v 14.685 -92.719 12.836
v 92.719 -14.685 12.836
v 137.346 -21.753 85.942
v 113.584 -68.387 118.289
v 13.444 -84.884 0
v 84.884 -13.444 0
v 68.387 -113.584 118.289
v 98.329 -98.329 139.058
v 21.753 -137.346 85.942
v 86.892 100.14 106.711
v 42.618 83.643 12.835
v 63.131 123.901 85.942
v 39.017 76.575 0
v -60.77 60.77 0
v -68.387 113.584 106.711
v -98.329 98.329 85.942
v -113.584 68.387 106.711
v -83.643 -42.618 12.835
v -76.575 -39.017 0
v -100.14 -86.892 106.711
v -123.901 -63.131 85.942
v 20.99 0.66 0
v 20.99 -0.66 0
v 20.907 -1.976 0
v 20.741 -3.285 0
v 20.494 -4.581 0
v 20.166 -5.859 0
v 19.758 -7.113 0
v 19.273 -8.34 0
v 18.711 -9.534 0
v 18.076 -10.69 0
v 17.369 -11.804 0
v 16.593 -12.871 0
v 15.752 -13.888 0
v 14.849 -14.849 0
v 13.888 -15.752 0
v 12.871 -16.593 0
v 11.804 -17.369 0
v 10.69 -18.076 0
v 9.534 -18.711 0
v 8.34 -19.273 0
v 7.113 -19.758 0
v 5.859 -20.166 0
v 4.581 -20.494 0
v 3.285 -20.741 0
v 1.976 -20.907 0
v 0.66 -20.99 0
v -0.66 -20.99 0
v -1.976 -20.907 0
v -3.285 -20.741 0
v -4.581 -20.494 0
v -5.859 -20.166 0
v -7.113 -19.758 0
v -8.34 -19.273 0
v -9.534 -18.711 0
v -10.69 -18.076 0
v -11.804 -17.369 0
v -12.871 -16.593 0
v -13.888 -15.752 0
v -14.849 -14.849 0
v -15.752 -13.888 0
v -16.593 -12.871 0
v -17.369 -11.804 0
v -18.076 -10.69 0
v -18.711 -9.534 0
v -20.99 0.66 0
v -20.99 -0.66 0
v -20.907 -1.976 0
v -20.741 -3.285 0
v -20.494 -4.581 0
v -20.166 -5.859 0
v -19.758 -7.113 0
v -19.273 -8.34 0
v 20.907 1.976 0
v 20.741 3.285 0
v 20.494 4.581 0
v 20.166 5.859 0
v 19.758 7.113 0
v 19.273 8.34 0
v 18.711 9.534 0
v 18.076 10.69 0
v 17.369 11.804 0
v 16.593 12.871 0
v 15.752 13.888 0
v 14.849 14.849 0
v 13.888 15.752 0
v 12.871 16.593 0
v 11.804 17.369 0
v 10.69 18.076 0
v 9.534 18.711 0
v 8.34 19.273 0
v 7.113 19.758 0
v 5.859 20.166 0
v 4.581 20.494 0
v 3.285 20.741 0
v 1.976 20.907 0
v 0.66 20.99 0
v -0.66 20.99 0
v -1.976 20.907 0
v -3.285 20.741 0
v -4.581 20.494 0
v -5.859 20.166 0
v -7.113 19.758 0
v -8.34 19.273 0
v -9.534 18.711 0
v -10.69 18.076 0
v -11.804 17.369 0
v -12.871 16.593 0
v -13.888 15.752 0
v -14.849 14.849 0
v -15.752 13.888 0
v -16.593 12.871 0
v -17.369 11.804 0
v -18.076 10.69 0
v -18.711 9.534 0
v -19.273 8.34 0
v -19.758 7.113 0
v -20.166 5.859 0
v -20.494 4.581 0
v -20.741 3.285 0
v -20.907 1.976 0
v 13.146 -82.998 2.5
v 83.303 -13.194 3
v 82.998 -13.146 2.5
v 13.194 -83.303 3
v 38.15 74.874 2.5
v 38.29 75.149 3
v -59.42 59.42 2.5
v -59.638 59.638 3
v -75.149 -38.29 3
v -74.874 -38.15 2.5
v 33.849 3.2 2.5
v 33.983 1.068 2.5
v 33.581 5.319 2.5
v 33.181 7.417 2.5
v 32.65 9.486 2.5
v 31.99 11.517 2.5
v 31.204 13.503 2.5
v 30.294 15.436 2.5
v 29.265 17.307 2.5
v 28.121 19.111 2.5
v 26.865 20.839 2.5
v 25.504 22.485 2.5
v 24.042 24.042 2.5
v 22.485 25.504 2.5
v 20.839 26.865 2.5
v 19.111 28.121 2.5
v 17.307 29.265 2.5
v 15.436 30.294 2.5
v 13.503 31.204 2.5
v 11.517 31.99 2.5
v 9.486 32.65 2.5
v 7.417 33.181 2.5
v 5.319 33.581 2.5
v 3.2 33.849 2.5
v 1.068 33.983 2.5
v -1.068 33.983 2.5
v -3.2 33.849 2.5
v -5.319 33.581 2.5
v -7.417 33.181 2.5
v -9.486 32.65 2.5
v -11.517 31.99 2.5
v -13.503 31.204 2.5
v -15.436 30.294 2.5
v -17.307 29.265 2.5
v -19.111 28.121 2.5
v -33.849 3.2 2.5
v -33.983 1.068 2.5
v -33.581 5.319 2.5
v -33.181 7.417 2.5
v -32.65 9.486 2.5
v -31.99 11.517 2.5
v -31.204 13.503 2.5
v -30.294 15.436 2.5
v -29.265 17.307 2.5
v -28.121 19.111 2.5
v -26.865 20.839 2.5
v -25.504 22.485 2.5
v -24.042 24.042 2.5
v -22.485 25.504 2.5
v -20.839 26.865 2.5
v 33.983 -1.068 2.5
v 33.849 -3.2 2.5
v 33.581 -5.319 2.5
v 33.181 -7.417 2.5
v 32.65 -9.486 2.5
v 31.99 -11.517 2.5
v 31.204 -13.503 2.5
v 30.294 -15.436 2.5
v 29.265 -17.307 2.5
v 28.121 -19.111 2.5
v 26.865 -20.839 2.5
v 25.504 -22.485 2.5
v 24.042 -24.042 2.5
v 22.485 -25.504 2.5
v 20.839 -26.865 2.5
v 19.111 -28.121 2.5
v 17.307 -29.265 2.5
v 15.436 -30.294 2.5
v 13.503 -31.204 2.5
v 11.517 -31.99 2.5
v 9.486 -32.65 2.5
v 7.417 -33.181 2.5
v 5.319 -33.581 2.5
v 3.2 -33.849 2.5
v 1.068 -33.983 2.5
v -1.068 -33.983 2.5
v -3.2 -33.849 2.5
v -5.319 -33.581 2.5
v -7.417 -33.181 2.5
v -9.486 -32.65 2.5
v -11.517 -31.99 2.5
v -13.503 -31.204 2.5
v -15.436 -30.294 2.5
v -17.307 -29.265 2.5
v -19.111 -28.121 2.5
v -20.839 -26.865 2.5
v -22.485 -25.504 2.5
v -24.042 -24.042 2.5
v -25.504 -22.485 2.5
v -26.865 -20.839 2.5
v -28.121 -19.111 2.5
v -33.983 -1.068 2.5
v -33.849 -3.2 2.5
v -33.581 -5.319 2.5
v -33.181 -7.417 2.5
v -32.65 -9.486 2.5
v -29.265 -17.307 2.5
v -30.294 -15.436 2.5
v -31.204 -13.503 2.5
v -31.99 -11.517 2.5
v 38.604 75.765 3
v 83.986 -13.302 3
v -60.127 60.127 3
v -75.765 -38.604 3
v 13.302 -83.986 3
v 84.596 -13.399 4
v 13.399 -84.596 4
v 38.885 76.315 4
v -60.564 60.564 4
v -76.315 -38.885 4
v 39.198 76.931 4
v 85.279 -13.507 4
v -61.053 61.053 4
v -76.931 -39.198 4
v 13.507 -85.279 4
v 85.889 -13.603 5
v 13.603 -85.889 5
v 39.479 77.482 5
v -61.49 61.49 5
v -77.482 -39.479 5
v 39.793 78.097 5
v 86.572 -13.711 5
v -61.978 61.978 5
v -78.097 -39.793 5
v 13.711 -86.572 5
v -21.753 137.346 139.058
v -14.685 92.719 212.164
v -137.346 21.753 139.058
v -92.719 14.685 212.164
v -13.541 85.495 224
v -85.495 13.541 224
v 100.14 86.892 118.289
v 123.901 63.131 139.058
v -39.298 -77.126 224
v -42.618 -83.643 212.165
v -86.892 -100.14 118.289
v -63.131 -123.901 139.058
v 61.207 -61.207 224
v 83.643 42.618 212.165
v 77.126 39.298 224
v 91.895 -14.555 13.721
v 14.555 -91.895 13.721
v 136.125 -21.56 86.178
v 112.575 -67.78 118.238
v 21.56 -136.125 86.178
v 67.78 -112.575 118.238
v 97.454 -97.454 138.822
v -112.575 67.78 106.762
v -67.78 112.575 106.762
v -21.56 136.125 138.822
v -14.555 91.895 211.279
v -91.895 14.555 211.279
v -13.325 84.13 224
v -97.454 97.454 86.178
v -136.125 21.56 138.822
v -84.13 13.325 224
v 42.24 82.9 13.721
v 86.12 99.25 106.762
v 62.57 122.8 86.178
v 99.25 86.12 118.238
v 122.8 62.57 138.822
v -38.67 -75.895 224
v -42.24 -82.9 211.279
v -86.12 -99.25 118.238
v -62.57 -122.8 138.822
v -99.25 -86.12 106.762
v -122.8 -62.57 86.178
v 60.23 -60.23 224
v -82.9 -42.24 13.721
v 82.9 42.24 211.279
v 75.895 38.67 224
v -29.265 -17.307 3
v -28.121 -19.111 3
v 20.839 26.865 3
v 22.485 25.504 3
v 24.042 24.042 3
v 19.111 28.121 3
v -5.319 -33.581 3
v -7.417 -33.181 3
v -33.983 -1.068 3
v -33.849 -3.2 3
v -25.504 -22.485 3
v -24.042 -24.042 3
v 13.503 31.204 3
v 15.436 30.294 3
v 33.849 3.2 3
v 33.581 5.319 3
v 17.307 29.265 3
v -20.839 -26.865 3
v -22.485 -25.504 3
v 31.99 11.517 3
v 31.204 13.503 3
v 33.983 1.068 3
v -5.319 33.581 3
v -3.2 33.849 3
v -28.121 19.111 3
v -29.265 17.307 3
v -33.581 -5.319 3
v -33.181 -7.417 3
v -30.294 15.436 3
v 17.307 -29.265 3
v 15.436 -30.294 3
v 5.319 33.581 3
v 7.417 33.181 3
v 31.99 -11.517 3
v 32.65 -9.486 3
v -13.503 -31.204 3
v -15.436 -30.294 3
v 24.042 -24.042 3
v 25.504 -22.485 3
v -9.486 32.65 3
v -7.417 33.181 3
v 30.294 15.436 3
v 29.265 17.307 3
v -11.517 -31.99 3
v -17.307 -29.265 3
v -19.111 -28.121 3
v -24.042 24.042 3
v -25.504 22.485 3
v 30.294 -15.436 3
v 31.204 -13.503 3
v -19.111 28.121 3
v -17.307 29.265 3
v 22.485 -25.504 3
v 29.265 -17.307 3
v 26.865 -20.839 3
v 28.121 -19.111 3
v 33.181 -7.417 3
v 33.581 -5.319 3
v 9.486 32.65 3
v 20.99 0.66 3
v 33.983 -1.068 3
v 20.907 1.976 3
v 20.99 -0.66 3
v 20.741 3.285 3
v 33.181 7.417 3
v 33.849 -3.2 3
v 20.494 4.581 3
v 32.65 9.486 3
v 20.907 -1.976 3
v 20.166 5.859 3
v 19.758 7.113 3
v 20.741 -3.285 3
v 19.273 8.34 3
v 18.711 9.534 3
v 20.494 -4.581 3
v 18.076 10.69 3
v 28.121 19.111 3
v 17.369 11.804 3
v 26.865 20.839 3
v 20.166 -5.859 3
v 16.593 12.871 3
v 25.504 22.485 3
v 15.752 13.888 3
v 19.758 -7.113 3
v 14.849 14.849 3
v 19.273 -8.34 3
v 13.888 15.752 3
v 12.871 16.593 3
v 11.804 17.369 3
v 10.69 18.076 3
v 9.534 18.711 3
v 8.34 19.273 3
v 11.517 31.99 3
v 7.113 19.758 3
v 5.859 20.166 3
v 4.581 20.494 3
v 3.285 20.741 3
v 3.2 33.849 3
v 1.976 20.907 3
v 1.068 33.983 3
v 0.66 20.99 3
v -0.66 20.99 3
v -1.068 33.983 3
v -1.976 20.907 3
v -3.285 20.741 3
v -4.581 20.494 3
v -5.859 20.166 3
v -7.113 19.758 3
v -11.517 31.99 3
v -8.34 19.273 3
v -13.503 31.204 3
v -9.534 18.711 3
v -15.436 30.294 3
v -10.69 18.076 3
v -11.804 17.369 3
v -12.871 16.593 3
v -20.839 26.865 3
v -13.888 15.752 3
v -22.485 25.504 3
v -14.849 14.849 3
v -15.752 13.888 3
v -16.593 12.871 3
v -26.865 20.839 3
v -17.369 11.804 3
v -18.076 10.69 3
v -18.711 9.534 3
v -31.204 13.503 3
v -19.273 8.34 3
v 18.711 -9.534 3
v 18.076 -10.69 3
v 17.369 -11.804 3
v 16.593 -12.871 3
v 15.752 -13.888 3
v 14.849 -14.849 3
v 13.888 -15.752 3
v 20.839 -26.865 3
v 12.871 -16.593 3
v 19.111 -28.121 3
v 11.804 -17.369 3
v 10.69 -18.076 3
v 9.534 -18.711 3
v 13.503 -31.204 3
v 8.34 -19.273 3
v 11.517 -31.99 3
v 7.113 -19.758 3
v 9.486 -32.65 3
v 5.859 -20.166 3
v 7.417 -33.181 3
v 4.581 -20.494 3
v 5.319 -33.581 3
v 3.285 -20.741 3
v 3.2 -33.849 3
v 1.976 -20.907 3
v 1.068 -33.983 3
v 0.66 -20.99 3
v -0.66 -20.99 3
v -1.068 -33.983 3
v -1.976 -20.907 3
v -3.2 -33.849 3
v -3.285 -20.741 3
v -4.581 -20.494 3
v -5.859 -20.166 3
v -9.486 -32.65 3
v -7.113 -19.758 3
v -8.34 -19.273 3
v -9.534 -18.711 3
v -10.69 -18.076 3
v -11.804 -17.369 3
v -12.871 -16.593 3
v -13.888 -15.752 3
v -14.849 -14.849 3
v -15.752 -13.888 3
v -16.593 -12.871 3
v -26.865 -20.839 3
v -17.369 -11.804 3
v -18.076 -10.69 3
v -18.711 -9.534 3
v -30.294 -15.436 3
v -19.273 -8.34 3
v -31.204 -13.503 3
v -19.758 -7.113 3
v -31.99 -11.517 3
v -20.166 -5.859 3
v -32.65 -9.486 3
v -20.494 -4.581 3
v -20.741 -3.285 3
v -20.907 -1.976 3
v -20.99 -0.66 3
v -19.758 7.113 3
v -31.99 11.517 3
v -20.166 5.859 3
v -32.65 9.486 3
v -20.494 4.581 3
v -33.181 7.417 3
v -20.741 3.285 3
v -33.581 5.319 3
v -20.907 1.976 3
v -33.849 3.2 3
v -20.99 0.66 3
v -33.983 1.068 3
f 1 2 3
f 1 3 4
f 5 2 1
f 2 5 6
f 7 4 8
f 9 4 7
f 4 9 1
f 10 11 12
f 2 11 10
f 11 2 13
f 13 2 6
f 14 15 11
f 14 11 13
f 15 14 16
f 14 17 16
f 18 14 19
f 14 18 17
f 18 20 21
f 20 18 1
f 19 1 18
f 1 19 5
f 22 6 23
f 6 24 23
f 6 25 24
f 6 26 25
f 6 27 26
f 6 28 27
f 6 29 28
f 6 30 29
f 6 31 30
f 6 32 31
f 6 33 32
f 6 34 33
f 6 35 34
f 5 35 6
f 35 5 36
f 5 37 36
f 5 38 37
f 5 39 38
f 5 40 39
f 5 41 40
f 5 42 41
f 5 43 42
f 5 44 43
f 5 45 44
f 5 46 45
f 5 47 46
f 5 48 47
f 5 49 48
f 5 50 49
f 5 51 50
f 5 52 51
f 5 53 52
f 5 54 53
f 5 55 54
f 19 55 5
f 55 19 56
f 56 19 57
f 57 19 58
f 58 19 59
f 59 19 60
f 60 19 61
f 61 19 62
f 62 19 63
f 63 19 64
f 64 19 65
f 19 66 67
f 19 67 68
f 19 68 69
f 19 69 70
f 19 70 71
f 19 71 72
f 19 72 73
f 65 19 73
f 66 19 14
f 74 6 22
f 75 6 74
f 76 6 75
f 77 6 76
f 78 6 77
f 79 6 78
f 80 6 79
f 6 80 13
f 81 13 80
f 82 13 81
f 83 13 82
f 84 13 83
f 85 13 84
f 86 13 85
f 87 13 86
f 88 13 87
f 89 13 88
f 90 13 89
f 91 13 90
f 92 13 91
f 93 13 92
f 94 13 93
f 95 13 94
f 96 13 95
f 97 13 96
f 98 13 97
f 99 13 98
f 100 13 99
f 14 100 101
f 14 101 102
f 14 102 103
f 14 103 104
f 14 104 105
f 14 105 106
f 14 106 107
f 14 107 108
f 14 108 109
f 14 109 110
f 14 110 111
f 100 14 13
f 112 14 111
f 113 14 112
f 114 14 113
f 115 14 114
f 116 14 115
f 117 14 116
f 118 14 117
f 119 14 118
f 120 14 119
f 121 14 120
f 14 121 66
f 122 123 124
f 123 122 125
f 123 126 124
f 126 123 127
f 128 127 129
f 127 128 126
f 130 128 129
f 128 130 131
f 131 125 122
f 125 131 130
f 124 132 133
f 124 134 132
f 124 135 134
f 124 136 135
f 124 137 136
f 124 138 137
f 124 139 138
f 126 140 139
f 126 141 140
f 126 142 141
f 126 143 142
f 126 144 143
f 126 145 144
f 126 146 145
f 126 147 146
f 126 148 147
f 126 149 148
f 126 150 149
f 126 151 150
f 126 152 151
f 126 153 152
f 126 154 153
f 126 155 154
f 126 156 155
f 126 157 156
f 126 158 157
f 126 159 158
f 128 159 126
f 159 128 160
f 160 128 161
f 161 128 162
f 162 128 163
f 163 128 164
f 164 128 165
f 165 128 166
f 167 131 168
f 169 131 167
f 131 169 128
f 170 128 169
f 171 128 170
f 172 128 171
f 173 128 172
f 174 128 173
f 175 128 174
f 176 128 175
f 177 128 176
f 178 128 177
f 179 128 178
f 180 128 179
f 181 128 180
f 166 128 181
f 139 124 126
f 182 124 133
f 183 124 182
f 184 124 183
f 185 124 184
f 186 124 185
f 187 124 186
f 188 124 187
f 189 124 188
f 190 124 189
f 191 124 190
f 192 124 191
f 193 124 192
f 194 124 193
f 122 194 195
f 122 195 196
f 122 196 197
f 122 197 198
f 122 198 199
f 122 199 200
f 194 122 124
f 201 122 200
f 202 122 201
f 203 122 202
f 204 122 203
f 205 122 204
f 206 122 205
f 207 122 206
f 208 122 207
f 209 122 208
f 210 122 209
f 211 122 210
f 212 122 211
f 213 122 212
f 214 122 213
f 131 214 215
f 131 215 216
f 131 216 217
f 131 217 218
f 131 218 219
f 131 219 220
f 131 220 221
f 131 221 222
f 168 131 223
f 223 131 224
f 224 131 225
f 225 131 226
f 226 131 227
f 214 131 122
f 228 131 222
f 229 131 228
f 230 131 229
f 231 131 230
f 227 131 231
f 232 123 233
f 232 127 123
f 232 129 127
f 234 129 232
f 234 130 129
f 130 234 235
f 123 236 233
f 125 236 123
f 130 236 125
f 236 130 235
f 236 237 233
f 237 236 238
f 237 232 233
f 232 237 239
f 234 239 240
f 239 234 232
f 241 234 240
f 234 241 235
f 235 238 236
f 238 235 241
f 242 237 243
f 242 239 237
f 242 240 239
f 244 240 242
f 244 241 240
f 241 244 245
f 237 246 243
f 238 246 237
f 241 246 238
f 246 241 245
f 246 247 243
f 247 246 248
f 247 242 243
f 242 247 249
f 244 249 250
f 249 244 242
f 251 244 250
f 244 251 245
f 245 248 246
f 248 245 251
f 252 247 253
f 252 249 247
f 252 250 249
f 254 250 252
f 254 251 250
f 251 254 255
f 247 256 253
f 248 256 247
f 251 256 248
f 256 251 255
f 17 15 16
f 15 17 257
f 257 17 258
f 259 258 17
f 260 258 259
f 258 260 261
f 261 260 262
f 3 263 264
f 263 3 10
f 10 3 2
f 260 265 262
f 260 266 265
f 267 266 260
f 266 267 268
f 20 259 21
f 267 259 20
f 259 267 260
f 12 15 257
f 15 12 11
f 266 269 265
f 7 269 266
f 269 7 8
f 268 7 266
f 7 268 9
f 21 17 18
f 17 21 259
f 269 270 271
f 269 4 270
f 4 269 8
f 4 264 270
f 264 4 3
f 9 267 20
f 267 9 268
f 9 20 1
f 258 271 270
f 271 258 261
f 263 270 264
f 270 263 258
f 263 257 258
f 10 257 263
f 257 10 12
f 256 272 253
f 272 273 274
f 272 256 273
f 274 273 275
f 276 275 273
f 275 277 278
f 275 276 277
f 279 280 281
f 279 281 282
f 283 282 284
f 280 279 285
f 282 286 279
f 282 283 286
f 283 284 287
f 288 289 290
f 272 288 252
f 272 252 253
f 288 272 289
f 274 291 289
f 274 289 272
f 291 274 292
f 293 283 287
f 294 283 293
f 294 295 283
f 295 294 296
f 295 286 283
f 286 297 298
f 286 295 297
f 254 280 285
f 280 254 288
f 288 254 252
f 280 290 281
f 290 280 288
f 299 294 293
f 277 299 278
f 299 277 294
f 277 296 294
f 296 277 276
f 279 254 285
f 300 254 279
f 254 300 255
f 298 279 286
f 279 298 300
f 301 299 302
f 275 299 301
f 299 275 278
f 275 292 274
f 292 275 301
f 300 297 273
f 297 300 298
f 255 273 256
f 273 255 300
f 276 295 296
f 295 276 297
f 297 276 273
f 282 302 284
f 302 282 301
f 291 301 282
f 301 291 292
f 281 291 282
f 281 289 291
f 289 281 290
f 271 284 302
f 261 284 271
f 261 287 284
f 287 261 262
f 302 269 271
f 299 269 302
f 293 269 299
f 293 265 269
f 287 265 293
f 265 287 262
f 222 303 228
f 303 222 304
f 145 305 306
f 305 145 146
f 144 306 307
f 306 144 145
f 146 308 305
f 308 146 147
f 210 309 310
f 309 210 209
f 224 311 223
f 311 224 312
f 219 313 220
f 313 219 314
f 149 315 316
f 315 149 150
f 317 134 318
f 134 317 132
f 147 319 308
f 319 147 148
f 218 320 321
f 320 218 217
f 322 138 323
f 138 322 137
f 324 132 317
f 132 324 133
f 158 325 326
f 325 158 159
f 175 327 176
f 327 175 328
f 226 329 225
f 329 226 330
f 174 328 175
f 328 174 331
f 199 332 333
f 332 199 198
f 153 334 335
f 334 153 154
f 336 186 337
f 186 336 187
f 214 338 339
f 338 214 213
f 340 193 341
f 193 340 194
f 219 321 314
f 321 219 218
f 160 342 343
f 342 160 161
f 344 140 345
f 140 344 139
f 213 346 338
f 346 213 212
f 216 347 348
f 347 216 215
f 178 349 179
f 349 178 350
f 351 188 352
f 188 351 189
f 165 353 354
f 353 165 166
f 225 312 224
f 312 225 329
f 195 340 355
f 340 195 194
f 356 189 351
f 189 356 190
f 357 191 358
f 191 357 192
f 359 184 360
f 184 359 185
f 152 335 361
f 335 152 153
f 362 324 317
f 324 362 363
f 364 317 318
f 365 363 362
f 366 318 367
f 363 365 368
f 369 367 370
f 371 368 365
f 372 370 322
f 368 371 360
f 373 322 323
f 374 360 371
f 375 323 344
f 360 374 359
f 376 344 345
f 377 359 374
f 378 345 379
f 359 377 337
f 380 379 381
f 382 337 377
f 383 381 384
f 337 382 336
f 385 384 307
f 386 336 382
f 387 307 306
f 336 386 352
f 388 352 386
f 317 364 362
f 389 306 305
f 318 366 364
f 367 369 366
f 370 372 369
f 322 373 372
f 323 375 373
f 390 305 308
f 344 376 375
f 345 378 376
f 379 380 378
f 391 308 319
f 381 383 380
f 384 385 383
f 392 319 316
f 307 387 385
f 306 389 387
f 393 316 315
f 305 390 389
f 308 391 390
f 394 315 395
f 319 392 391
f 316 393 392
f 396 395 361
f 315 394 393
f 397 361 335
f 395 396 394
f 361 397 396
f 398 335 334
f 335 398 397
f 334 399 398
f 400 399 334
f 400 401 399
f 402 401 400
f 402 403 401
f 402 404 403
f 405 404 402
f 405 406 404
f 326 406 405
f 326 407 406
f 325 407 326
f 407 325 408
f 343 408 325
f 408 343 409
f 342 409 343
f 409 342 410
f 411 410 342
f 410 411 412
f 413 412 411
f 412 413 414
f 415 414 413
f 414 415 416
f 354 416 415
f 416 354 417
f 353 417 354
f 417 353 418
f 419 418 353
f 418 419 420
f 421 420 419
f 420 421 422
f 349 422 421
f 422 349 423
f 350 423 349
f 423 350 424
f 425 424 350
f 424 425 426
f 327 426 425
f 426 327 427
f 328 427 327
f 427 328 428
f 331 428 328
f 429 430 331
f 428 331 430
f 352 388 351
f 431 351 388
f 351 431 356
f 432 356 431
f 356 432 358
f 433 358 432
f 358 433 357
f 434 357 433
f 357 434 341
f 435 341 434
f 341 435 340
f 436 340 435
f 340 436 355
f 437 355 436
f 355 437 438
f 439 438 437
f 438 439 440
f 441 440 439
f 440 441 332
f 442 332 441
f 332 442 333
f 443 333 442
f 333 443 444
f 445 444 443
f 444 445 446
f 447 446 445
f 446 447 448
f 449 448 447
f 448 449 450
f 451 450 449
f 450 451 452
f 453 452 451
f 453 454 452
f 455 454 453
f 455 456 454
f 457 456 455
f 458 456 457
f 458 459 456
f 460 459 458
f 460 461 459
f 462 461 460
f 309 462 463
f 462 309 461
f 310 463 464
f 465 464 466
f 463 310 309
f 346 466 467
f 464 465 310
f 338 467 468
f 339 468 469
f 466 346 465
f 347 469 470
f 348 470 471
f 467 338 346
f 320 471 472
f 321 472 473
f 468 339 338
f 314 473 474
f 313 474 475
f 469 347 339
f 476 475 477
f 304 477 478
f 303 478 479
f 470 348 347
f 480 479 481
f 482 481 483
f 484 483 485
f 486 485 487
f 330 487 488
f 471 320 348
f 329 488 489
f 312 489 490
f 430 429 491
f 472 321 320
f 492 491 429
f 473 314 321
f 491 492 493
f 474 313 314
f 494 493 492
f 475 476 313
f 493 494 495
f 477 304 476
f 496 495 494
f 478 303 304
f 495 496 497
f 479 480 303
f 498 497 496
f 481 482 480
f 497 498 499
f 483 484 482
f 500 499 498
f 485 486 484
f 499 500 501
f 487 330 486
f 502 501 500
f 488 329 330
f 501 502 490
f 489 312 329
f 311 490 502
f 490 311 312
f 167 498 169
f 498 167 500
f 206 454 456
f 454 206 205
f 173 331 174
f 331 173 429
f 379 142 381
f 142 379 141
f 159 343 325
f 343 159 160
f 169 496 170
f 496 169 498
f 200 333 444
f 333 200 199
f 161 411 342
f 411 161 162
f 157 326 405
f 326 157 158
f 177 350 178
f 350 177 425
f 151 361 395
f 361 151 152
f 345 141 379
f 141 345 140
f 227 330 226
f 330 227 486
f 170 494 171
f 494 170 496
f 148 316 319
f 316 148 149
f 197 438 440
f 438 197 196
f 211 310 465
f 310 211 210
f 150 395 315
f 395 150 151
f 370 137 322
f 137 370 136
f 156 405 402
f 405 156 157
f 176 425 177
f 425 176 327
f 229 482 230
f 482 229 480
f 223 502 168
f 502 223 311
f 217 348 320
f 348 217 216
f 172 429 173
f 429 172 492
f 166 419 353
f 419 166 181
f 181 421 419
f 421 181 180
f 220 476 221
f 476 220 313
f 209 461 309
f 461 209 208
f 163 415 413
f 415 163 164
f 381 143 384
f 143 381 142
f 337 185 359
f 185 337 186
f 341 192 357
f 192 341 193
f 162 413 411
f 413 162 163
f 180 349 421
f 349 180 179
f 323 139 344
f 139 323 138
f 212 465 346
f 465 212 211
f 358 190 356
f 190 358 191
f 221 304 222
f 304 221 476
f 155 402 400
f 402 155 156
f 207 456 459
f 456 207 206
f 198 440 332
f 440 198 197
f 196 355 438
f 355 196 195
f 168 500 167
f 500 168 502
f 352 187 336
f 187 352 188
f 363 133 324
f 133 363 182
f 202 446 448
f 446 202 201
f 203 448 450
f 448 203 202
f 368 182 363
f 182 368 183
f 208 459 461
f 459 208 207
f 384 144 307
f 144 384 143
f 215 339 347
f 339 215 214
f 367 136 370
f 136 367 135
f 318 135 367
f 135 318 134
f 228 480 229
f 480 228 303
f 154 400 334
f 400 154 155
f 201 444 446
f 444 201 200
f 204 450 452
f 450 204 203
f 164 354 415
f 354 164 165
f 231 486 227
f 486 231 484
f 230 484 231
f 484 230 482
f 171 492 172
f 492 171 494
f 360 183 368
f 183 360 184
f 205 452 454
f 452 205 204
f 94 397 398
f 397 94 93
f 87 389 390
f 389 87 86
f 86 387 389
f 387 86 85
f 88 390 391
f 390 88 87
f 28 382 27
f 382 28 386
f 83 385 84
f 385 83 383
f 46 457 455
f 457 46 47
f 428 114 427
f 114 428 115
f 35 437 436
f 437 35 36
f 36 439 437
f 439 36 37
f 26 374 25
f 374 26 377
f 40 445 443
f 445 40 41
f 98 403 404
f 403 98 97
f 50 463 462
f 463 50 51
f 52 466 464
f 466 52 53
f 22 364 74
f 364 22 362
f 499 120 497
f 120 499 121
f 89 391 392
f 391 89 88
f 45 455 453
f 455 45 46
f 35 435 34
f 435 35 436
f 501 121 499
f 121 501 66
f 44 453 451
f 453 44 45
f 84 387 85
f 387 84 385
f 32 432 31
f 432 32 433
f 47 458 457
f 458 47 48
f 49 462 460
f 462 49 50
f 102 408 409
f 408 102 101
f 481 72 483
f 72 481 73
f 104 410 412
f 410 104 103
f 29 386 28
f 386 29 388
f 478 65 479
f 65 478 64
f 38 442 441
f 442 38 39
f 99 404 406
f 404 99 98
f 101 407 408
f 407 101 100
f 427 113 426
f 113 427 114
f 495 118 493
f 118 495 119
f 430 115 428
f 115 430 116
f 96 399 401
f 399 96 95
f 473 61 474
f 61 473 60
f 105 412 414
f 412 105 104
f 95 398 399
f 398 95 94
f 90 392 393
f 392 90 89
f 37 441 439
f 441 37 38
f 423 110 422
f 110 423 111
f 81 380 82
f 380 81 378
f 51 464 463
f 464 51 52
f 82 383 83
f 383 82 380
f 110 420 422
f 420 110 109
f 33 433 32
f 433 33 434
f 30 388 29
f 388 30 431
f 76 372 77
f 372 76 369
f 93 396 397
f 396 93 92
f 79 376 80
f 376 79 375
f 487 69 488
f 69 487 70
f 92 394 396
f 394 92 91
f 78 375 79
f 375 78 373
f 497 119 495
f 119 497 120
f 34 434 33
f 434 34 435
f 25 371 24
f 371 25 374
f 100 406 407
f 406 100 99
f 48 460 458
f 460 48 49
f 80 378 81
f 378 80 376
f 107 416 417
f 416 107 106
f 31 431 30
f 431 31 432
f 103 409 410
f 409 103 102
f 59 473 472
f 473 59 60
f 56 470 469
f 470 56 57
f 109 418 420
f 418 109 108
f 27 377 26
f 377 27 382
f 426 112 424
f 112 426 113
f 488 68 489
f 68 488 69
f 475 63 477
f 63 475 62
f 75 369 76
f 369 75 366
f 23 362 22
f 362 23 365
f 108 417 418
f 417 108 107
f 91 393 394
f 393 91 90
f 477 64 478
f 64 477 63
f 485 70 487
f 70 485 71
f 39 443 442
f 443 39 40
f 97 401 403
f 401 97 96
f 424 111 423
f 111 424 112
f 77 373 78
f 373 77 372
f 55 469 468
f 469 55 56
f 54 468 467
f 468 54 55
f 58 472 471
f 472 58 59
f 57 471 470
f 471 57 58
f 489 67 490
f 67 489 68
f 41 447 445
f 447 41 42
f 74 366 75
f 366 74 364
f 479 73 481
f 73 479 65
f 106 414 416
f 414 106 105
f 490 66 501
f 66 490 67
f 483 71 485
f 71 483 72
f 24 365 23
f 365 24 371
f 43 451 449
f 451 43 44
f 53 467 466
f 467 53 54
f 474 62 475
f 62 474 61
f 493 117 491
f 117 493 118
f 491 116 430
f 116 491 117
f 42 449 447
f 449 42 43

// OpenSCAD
/*
 * Customizable Lamp Shade - https://www.thingiverse.com/thing:2372190
 * by Dennis Hofmann - https://www.thingiverse.com/mightynozzle/about
 * created 2017-06-08
 * version v1.0
 *
 * This work is licensed under the Creative Commons - Attribution - Non-Commercial license.
 * https://creativecommons.org/licenses/by-nc/3.0/
*/


 // Parameter Section//
//------------------//

// choose the shape of the lamp shade
lamp_shape = "dodecahedron"; //[simple,sphere,flower,dodecahedron]

// [Simple, sphere and flower shape] Resolution of round shapes. You can also use this value as the number of edges of the simple shade. If you want a cube or a pyramide, set the value of 4. If you want a cylinder or a cone, set the value of 100-255. Create a star shape with the flower shape with resolution of 3-5. Minimum value for a sphere shape is 7. You can use a low resolution (e.g. 16-32) to create a low polygon style. You can create some interesting shapes with this parameter. Just try some different values!
resolution = 64; //[3:255]

// Thinner for more translucency, thicker for more stable lamp shade. Default: 1.0
shell_thickness_in_millimeter = 1.0;

// [All lamp shapes] Set the diameter of the base of the lamp shade. The base is the position, where the bulb fitting is located. This parameter is used for all lamp shapes.
lamp_shade_base_diameter_in_millimeter = 225.0; //[1:300]

// [Simple and flower shape] Set the diameter of the head of the lamp shade. The head is the top position of the lamp shade. If this value is higher or lower than the base diameter, you get a cone or pyramide. Lower value can be used for desk lamp, higher value can be used for ceiling lamp. This parameter is used for simple and flower shape.
lamp_shade_head_diameter_in_millimeter = 10.0; //[1:300]

// [Simple and flower shape] Set the height of the lamp shade. This parameter is used for simple and flower shape
lamp_shade_height_in_millimeter = 110.0; //[1:300]

// [Sphere and dodecahedron shape] Set the cut height of the head of the shape. 0 means a closed top. It is like sclicing the top of an apple with a knife. This parameter is used for sphere and dodecahedron shape.
head_cut_height_in_millimeter = 1.0; //[0:200]

// [Sphere shape only] Set the cut height from the base of the shape. It is like sclicing the bottom of an apple with a knife. This parameter is used for sphere and dodecahedron shape.
base_cut_height_in_millimeter = 10.0;  //[0:200]

// [Flower shape only] This parameter only is used for flower shape
number_of_flower_leaves = 8; //[2:64]

// Set the diameter of the bulb bracket you want to use. Add a little extra for tolerance like 2mm if you are using a outside threaded bracket + nut/ring. If you are using a threadless bracket, it depends on the material. If it is a silicone one, you can use a little smaller hole. If it is non elastic plastic, this could be a challenge. If it is to loose, you can try to glue the gap between bracket and the lamp shade. Or do some test prints of the first 5-10 layers, before printing the whole lamp shade. Use 0, if you don't need a hole.
//bulb_bracket_diameter_in_millimeter = 0;
bulb_bracket_diameter_in_millimeter = 42.0;

// This is the additional support height for the bulb bracket. Depending on the bulb bracket you are using, this extra makes the hole more stable.
bulb_bracket_support_height_in_millimeter = 2.0;

// This is the additional support width for the bulb bracket. Depending on the bulb bracket you are using, this extra makes the hole more stable.
bulb_bracket_support_width_in_millimeter = 13.0;
//bulb_bracket_support_width_in_millimeter = 0.0;

// [Dodecahedron shape only] Extra support between walls and floor
use_dodecahedron_support = true;

// Later, perhaps (see above)
//floor_wall_support_thickness_in_millimeters = 2;
//floor_wall_support_width_in_millimeters = 6;
//floor_wall_support_height_in_millimeters = 6;

/* [Hidden] */
shape_height = lamp_shade_height_in_millimeter;
base_cut = base_cut_height_in_millimeter;
head_cut = head_cut_height_in_millimeter;
shell = shell_thickness_in_millimeter;
flower_leaves = number_of_flower_leaves;
bulb_bracket_d = bulb_bracket_diameter_in_millimeter;
bulb_bracket_support_w = bulb_bracket_support_width_in_millimeter;
bulb_bracket_support_h = bulb_bracket_support_height_in_millimeter;
shape_base_outside = lamp_shade_base_diameter_in_millimeter;
shape_head_outside = lamp_shade_head_diameter_in_millimeter;

shape_base_inside = shape_base_outside - shell * 2;
shape_head_inside = shape_head_outside - shell * 2;
$fn=resolution;


 // Program Section//
//-----------------//

// Main lampshade
color("DeepSkyBlue") rotate([0,0,45]) {
    difference() {
        union() {
            // Shape part
            if (lamp_shape == "simple") {
                simple_shape();
            } else if (lamp_shape == "sphere") {
                sphere_shape();
            } else if (lamp_shape == "flower") {
                flower_shape();
            } else if (lamp_shape == "dodecahedron") {
                if (use_dodecahedron_support) {
                    dodecahedron_support();
                }
                dodecahedron_shape();
            } else {
                echo("ERROR: Invalid lamp shade: \"", lam_shade, "\"");
            }
            
            // Bulb bracket support
            cylinder(d = bulb_bracket_d + bulb_bracket_support_w * 2, h = bulb_bracket_support_h + shell, $fn=100);
        }
        // Bottom bulb bracket hole
        translate([0,0,- 0.1]) {
            cylinder(d = bulb_bracket_d, h = shell + bulb_bracket_support_h + 0.2, $fn=100);
        }
    }
}

// Dodecahedron support
// FIXME: DIRTY HACK
module dodecahedron_support() {
    dodecahedron_shape(outside=shape_base_outside, inside=shape_base_inside-3, cut=shape_base_inside-1);
    dodecahedron_shape(outside=shape_base_outside, inside=shape_base_inside-2, cut=shape_base_inside-2);
    dodecahedron_shape(outside=shape_base_outside, inside=shape_base_inside-1, cut=shape_base_inside-3);
}

 // Module Section//
//---------------//

module simple_shape() {
    difference() {
        cylinder(d1 = shape_base_outside, d2 = shape_head_outside, h = shape_height);
        translate([0, 0, shell]) {
            cylinder(d1 = shape_base_inside, d2 = shape_head_inside, h = shape_height);
        }
    }
}

module sphere_shape() {
    translate([0, 0, shape_base_outside / 2 - base_cut]) {
        difference() {
            base_cut_sphere(shape_base_outside, base_cut);
            translate([0, 0, shell / 2]) {
                base_cut_sphere(shape_base_inside, base_cut);
            }
            // Head Cut
            translate([0, 0, shape_base_outside / 2 - head_cut]) {
                cylinder(d = shape_base_outside * 2, h = head_cut);
            }
        }
    }
}

module flower_shape() {
    difference() {
        flower(shape_base_outside, shape_head_outside);
        translate([0, 0, shell]) {
            flower(shape_base_inside, shape_head_inside);
        }
    }
}

module dodecahedron_shape(outside=shape_base_outside, inside=shape_base_inside, cut=head_cut) {
    translate([0, 0, outside / 2]) {
        difference() {
            dodecahedron(outside);
            dodecahedron(inside);
            // Head Cut
            translate([0, 0, outside / 2 - cut]) {
                cylinder(d = outside * 2, h = cut + 0.1);
            }
        }
    }
}

module base_cut_sphere(size, base) {
    difference() {
        sphere(d = size);
        // Base Cut
        translate([0, 0, - size / 2]) {
            cylinder(d = size * 2, h = base);
        }
    }
}

module dodecahedron(size) {
        scale([size, size, size]) {
        intersection() {
            cube([2, 2, 1], center = true);
            intersection_for(i = [0:4]) {
                rotate([0, 0, 72 * i]) {
                    rotate([116.565, 0, 0]) {
                        cube([2, 2, 1], center = true);
                    }
                }
            }
        }
    }
}

module flower(size1, size2) {
    leaf_diameter1 = size1 * 3 / flower_leaves;
    leaf_diameter2 = size2 * 3 / flower_leaves;
    
    difference() {
        union() {
            cylinder(d1 = size1 - leaf_diameter1,, d2 = size2 - leaf_diameter2, h = shape_height, $fn=100);
            for(leaf = [0:flower_leaves]) {
                rotate([0, 0, 360 / flower_leaves * leaf]) {
                    hull() {
                        translate([(size1 - leaf_diameter1) / 2, 0, 0]) {
                            cylinder(d = leaf_diameter1, h = 0.1);
                        }
                        translate([(size2 - leaf_diameter2) / 2, 0, shape_height]) {
                            cylinder(d = leaf_diameter2, h = 0.1);
                        }
                    }
                }        
            }
        }
        translate([0, 0, shape_height]) {
            cylinder(d = size2 + 1, h = 0.2);
        }
    }
}
